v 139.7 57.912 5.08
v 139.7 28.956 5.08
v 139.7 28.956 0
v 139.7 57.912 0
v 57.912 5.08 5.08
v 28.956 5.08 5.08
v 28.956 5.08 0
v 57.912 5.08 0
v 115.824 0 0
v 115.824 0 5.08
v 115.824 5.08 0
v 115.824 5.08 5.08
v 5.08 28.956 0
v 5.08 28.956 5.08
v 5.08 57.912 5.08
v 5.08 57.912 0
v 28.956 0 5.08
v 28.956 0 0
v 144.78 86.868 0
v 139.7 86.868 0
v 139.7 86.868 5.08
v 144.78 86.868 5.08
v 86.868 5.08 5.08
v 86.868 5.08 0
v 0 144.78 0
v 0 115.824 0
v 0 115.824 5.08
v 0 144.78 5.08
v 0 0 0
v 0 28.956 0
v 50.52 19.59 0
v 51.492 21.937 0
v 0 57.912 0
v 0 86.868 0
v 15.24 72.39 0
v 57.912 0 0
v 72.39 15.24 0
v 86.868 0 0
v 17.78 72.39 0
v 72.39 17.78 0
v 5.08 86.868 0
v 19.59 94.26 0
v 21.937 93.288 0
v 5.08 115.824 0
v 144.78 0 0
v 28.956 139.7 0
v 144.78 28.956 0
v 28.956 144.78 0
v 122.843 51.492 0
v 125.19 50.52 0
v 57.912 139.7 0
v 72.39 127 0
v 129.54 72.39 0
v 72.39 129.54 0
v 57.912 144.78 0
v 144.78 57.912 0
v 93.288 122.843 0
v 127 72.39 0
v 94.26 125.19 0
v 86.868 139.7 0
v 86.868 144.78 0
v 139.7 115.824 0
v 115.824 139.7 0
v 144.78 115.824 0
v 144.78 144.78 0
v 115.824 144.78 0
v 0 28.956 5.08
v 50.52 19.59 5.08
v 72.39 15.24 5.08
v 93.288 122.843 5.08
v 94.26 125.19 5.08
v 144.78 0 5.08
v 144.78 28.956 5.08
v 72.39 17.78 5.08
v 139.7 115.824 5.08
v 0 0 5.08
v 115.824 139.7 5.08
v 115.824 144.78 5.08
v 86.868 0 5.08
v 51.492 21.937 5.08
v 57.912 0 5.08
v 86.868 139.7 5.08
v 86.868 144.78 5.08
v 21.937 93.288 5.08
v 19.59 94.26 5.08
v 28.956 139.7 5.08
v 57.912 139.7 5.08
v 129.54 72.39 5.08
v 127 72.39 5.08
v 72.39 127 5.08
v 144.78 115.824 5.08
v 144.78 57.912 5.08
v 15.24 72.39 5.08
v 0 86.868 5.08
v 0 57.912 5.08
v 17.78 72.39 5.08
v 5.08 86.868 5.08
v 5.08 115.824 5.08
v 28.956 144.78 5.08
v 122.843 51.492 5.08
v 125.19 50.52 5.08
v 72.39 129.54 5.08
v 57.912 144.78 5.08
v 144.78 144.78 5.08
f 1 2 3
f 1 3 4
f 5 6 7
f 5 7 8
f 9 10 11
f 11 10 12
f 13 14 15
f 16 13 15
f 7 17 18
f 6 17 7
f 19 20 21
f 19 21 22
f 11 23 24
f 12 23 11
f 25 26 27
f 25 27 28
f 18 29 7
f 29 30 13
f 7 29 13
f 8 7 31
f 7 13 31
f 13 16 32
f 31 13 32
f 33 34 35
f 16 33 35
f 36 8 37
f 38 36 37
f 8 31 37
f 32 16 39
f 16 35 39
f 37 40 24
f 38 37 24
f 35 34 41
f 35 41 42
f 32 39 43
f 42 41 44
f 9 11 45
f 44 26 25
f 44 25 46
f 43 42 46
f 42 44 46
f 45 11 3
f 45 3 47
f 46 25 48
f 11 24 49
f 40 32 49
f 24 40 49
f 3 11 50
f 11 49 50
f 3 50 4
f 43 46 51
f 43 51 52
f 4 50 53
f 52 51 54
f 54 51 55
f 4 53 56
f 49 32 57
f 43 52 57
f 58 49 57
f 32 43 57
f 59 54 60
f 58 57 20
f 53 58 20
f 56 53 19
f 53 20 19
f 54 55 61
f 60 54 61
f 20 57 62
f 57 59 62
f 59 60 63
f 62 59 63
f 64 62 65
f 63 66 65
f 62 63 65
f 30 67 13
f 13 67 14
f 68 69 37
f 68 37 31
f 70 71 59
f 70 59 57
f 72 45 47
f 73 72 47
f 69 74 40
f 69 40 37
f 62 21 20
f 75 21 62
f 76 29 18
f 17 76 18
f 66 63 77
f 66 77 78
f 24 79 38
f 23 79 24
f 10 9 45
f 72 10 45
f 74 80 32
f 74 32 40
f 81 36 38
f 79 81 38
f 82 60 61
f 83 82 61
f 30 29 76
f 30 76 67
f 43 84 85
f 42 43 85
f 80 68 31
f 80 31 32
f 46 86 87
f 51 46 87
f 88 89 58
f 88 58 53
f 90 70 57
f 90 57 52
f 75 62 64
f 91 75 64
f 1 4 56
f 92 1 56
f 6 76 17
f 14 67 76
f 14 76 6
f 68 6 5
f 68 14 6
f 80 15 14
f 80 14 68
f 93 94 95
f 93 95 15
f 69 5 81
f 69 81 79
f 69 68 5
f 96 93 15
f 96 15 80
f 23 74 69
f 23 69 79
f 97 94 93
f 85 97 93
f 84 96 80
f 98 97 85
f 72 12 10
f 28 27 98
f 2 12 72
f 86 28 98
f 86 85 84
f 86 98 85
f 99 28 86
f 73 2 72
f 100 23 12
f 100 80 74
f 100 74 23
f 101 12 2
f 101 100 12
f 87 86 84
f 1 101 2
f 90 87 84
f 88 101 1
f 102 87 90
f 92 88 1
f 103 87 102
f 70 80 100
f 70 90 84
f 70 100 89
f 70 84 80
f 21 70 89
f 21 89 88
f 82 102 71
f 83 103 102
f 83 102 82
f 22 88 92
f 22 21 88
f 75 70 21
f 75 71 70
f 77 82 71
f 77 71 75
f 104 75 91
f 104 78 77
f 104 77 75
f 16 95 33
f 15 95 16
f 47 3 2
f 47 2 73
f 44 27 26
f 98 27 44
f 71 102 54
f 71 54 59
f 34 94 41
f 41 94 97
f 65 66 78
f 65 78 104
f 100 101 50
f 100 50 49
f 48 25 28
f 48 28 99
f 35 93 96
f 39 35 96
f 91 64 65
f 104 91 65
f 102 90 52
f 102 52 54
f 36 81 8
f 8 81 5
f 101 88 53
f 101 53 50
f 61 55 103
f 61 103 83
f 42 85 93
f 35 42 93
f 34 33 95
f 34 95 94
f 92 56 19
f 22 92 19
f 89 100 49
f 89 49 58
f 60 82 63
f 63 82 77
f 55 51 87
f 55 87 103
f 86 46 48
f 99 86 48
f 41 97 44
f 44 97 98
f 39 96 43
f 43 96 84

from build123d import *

# Parameters (mm, degrees)
SKETCH1_W           = 144.78
SKETCH1_H           = 144.78
BOSS_EXTRUDE1_DEPTH = 5.08
SKETCH3_W           = 5.08
SKETCH3_H           = 28.956
SKETCH3_W_2         = 28.956
SKETCH3_H_2         = 5.08
CUT_EXTRUDE1_DEPTH  = 205.812849206
CUT_EXTRUDE3_DEPTH  = 205.812849206


with BuildPart() as part:
    # Sketch1 → Boss-Extrude1 (new body)
    with BuildSketch(Plane.XY):
        with Locations((72.39, 72.39)):
            Rectangle(SKETCH1_W, SKETCH1_H)
    extrude(amount=BOSS_EXTRUDE1_DEPTH)

    # Sketch3 → Cut-Extrude1 (cut, through all)
    with BuildSketch(Plane.XY.offset(5.08)):
        with Locations((2.54, 101.346)):
            Rectangle(SKETCH3_W, SKETCH3_H)
        with Locations((2.54, 43.434)):
            Rectangle(SKETCH3_W, SKETCH3_H)
        with Locations((142.24, 101.346)):
            Rectangle(SKETCH3_W, SKETCH3_H)
        with Locations((142.24, 43.434)):
            Rectangle(SKETCH3_W, SKETCH3_H)
        with Locations((43.434, 142.24)):
            Rectangle(SKETCH3_W_2, SKETCH3_H_2)
        with Locations((101.346, 142.24)):
            Rectangle(SKETCH3_W_2, SKETCH3_H_2)
        with Locations((43.434, 2.54)):
            Rectangle(SKETCH3_W_2, SKETCH3_H_2)
        with Locations((101.346, 2.54)):
            Rectangle(SKETCH3_W_2, SKETCH3_H_2)
    extrude(amount=-CUT_EXTRUDE1_DEPTH, mode=Mode.SUBTRACT)

    # Sketch7 → Cut-Extrude3 (cut, through all)
    with BuildSketch(Plane.XY.offset(5.08)):
        Polygon((72.39, 129.54), (94.26035816, 125.189715283), (93.288342241, 122.84306127), (72.39, 127), align=None)
        Polygon((129.54, 72.39), (125.189715283, 50.51964184), (122.84306127, 51.491657759), (127, 72.39), align=None)
        Polygon((72.39, 15.24), (50.51964184, 19.590284717), (51.491657759, 21.93693873), (72.39, 17.78), align=None)
        Polygon((17.78, 72.39), (21.93693873, 93.288342241), (19.590284717, 94.26035816), (15.24, 72.39), align=None)
    extrude(amount=-CUT_EXTRUDE3_DEPTH, mode=Mode.SUBTRACT)


solid = part.part
